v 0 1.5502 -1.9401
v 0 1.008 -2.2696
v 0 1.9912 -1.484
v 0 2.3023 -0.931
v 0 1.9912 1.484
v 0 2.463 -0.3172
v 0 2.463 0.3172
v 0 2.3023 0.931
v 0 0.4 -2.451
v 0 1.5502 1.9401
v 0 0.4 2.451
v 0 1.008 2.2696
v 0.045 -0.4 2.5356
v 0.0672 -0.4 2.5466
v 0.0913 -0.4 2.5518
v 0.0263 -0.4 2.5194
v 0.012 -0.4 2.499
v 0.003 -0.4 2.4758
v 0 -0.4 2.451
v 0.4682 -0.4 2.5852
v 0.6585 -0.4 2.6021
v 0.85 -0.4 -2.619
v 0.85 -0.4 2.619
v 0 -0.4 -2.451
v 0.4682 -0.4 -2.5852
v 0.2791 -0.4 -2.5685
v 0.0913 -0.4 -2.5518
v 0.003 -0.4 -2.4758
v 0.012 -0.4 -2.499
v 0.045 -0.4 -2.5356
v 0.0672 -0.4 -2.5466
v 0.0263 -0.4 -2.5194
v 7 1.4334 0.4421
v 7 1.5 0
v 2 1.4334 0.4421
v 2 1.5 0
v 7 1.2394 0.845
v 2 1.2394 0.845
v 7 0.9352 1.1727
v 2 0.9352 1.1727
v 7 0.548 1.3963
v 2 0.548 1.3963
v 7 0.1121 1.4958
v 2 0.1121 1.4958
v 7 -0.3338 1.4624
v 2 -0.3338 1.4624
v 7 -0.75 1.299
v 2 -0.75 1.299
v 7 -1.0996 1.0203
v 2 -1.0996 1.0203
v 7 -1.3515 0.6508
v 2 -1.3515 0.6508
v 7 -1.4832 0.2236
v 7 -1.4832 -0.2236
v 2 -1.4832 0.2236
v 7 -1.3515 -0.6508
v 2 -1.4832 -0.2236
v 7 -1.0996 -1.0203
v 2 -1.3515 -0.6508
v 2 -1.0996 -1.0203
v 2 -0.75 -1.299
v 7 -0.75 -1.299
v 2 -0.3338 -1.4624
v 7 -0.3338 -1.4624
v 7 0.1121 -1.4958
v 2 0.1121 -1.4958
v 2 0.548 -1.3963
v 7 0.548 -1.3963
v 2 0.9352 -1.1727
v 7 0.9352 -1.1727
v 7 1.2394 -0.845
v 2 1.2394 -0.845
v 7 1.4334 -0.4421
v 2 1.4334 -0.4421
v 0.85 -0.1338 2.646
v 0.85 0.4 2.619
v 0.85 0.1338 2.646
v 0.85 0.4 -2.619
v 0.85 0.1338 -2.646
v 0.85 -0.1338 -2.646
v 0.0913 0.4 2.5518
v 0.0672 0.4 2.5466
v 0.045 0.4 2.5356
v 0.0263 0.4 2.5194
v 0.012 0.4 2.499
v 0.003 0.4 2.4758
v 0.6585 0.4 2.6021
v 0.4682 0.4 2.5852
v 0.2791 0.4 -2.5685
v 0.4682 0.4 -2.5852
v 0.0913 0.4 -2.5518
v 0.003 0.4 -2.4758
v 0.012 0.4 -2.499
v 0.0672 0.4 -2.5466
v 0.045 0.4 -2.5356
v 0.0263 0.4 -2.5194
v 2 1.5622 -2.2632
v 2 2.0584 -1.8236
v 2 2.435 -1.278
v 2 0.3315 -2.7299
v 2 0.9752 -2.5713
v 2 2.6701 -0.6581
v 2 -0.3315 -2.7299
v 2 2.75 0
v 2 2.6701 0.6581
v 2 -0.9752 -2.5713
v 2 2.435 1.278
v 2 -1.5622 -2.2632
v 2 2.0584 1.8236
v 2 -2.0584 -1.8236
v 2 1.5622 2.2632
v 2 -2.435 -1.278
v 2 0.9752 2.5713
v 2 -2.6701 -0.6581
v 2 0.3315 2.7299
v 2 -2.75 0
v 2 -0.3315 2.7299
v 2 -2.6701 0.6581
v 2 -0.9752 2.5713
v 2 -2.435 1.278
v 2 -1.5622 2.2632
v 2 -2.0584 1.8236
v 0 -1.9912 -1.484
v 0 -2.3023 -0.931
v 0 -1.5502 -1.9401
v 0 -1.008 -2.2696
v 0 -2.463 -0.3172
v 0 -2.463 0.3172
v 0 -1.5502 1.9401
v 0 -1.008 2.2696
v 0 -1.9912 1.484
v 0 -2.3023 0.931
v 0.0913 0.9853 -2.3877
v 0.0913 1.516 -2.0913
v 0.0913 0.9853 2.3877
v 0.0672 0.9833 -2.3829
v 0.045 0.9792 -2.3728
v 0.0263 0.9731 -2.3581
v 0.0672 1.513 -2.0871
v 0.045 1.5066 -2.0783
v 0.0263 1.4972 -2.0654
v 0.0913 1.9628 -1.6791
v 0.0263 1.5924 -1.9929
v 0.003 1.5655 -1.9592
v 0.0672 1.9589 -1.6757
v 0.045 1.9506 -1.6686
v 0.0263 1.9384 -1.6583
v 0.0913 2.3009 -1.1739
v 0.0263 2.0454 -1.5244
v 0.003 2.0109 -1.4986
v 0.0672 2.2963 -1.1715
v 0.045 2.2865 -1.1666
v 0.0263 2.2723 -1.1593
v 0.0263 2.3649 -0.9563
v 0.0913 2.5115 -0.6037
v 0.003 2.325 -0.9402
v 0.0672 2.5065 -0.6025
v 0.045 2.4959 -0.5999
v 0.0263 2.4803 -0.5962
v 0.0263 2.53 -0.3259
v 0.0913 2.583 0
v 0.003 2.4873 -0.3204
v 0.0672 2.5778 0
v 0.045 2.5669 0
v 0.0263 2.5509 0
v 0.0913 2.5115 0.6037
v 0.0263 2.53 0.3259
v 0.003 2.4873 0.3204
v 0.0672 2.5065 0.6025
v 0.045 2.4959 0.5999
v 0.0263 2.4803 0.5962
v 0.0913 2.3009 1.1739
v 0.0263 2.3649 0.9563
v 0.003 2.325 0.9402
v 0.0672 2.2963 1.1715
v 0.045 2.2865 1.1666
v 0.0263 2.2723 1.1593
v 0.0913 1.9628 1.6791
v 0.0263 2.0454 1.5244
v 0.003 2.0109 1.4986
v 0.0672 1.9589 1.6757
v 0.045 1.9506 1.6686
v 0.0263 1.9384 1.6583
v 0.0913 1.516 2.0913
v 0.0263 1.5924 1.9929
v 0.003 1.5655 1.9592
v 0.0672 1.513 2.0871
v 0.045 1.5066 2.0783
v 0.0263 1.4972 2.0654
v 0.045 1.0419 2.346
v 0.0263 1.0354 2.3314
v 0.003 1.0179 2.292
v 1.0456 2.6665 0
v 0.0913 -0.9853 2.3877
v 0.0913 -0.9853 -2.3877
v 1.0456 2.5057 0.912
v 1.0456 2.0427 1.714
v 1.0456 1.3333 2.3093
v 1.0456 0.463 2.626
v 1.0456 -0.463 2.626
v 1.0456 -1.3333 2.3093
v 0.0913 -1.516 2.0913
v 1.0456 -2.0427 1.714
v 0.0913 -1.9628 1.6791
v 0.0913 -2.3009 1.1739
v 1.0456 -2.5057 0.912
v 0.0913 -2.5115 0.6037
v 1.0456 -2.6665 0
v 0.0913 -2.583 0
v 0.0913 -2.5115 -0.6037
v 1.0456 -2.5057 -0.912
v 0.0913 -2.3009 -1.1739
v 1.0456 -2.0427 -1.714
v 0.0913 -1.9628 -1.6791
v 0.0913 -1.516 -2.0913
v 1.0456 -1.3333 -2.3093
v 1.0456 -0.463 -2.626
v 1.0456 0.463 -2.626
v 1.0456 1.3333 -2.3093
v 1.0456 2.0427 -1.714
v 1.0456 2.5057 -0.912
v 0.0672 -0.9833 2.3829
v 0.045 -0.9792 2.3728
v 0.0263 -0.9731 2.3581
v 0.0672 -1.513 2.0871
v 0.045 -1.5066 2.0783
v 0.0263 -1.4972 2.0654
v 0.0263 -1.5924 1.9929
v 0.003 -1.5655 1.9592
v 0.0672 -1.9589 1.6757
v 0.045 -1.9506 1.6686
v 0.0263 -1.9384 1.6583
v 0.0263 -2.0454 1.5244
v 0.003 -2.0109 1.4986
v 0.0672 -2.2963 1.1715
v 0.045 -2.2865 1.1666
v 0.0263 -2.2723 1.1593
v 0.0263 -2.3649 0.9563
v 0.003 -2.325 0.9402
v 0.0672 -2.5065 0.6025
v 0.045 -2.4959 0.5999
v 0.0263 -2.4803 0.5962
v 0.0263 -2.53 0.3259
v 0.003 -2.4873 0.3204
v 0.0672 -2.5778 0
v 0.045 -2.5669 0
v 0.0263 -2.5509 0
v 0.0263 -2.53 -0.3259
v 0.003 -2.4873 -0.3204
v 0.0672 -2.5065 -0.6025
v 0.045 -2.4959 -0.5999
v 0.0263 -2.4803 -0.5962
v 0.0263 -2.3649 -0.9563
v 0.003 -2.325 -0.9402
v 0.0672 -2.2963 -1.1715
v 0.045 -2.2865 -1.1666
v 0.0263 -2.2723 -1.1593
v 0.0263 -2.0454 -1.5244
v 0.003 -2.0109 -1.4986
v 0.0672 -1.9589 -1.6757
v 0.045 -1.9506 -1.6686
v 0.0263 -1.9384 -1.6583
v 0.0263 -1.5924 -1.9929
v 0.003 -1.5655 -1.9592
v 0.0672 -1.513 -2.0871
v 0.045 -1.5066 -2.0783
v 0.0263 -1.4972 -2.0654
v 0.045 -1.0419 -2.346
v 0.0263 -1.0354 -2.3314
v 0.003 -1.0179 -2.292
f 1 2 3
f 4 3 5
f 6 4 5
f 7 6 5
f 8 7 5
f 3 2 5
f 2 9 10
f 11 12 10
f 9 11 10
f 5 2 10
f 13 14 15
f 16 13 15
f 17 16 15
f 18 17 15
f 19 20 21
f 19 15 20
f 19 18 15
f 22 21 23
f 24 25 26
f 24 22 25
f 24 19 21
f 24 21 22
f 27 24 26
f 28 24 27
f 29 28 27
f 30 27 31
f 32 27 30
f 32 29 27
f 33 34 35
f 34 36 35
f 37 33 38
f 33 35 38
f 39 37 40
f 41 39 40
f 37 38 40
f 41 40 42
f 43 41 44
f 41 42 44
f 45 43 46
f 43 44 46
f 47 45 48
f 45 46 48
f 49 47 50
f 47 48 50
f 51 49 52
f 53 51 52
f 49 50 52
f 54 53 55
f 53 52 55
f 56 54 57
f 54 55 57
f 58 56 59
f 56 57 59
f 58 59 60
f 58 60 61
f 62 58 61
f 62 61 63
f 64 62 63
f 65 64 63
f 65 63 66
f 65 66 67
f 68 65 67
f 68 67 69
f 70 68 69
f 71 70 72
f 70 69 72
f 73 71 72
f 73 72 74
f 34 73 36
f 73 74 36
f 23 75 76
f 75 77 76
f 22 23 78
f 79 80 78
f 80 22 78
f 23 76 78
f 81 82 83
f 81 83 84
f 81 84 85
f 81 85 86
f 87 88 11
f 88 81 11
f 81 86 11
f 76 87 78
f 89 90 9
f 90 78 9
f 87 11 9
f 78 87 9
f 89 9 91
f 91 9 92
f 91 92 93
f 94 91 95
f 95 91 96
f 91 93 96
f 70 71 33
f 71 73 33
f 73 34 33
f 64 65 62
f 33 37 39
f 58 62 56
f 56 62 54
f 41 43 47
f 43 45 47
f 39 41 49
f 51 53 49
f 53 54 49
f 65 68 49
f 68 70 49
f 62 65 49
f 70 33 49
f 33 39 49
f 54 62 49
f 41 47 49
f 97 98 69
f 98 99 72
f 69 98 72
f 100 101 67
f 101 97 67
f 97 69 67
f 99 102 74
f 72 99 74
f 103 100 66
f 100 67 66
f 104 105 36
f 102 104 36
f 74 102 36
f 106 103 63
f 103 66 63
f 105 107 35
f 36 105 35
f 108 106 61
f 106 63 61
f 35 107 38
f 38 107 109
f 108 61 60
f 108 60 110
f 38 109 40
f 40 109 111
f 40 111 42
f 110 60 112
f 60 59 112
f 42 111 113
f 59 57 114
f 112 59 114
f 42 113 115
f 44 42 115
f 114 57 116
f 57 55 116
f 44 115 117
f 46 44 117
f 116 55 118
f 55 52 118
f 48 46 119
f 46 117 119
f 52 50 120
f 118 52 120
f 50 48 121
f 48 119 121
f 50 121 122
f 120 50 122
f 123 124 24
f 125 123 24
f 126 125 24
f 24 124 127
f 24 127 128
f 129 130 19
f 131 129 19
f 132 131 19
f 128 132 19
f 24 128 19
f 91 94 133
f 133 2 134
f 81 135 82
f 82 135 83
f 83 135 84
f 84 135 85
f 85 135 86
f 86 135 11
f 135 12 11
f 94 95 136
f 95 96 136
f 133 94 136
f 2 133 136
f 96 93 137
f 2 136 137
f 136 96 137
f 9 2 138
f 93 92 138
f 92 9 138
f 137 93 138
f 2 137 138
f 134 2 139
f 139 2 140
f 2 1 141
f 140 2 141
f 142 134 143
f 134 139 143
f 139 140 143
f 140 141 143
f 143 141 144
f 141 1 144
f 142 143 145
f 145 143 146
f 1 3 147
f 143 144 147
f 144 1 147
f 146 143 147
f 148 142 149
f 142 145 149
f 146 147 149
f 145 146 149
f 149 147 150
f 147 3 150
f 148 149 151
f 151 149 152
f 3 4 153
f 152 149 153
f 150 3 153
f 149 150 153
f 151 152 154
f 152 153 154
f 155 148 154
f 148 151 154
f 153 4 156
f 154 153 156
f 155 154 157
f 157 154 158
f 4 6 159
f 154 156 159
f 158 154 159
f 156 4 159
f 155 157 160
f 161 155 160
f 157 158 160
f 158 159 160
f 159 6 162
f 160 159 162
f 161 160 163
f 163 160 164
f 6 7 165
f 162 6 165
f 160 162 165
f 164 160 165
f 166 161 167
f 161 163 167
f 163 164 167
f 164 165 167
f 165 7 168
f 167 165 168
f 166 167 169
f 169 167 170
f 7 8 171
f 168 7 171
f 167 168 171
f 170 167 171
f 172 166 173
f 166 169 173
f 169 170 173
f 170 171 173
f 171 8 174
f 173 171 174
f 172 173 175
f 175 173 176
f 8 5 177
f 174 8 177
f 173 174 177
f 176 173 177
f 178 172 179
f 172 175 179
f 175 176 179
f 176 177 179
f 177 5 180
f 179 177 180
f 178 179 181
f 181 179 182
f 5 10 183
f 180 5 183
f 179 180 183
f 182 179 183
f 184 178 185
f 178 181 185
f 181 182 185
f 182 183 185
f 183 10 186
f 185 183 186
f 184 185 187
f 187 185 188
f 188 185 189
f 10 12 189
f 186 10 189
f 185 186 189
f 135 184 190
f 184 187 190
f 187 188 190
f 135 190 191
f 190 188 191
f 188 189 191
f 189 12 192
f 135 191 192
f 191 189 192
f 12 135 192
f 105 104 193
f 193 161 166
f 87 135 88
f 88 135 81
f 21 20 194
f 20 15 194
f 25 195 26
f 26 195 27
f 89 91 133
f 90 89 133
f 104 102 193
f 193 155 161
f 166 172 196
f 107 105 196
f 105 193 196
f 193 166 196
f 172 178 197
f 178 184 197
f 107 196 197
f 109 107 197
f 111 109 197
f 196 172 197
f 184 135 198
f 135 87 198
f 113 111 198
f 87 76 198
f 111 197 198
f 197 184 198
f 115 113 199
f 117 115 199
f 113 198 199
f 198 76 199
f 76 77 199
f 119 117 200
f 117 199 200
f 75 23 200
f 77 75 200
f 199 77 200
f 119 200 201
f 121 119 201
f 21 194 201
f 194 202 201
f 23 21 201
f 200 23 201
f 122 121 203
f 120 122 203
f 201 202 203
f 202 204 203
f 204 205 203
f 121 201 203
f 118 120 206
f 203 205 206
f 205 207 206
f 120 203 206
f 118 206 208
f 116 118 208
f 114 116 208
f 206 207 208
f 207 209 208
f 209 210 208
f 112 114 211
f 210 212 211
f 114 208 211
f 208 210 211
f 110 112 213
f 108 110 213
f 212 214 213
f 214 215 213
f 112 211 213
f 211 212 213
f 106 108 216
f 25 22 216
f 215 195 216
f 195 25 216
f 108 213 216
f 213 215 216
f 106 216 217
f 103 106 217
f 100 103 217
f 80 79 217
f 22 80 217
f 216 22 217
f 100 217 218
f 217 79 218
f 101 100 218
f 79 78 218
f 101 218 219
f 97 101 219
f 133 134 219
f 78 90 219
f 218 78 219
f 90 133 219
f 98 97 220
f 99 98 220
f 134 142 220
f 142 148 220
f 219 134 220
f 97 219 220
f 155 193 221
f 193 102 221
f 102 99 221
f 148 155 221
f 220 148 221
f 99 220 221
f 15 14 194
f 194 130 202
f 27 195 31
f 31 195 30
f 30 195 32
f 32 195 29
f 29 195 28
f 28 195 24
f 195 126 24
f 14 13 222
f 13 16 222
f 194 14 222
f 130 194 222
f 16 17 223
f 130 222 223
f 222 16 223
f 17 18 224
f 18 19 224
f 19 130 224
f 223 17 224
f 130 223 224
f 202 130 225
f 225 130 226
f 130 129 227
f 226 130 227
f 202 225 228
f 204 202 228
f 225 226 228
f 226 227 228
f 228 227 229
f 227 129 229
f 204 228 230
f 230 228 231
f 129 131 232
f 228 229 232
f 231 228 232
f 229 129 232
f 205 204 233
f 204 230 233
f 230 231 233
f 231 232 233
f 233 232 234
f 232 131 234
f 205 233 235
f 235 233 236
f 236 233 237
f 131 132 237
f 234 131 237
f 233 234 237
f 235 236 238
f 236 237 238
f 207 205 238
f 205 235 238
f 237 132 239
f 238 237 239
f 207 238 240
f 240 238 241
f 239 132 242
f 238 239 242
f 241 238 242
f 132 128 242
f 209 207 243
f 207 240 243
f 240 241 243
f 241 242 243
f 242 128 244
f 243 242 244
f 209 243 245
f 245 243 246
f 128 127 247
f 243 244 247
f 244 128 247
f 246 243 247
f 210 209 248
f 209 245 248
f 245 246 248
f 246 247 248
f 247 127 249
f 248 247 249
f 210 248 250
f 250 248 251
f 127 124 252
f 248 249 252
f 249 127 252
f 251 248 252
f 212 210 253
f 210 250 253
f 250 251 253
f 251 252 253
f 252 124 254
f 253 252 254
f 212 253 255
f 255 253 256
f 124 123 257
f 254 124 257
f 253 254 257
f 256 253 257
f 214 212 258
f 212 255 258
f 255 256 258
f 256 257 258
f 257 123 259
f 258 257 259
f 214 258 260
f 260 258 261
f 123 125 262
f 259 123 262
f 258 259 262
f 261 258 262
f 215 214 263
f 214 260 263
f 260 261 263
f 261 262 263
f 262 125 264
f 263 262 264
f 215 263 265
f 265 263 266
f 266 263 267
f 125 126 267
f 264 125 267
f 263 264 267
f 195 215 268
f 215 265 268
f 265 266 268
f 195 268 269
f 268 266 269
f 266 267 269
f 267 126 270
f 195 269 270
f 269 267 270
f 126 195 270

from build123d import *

# Parameters (mm, degrees)
FILLET2_R  = 0.1
SKETCH2_W  = 5.5
SKETCH2_H  = 0.8
SLOT_DEPTH = 0.85


with BuildPart() as part:
    # BodySke → Base-Revolve (revolve)
    with BuildSketch(Plane.XY):
        Polygon((2, 1.5), (2, 2.75), (0, 2.575022673), (0, 0), (7, 0), (7, 1.5), align=None)
    revolve(axis=Axis((-25.4, 0, 0), (1, 0, 0)))

    # Fillet2
    fillet2_edges = [part.edges().sort_by_distance(p)[0] for p in [
        (0, -2.575022673, 0),
    ]]
    fillet(fillet2_edges, radius=FILLET2_R)

    # Sketch2 → Slot (cut)
    with BuildSketch(Plane(origin=(0, 0, 0), x_dir=(0, 0, -1), z_dir=(1, 0, 0))):
        Rectangle(SKETCH2_W, SKETCH2_H)
    extrude(amount=SLOT_DEPTH, mode=Mode.SUBTRACT)


solid = part.part
